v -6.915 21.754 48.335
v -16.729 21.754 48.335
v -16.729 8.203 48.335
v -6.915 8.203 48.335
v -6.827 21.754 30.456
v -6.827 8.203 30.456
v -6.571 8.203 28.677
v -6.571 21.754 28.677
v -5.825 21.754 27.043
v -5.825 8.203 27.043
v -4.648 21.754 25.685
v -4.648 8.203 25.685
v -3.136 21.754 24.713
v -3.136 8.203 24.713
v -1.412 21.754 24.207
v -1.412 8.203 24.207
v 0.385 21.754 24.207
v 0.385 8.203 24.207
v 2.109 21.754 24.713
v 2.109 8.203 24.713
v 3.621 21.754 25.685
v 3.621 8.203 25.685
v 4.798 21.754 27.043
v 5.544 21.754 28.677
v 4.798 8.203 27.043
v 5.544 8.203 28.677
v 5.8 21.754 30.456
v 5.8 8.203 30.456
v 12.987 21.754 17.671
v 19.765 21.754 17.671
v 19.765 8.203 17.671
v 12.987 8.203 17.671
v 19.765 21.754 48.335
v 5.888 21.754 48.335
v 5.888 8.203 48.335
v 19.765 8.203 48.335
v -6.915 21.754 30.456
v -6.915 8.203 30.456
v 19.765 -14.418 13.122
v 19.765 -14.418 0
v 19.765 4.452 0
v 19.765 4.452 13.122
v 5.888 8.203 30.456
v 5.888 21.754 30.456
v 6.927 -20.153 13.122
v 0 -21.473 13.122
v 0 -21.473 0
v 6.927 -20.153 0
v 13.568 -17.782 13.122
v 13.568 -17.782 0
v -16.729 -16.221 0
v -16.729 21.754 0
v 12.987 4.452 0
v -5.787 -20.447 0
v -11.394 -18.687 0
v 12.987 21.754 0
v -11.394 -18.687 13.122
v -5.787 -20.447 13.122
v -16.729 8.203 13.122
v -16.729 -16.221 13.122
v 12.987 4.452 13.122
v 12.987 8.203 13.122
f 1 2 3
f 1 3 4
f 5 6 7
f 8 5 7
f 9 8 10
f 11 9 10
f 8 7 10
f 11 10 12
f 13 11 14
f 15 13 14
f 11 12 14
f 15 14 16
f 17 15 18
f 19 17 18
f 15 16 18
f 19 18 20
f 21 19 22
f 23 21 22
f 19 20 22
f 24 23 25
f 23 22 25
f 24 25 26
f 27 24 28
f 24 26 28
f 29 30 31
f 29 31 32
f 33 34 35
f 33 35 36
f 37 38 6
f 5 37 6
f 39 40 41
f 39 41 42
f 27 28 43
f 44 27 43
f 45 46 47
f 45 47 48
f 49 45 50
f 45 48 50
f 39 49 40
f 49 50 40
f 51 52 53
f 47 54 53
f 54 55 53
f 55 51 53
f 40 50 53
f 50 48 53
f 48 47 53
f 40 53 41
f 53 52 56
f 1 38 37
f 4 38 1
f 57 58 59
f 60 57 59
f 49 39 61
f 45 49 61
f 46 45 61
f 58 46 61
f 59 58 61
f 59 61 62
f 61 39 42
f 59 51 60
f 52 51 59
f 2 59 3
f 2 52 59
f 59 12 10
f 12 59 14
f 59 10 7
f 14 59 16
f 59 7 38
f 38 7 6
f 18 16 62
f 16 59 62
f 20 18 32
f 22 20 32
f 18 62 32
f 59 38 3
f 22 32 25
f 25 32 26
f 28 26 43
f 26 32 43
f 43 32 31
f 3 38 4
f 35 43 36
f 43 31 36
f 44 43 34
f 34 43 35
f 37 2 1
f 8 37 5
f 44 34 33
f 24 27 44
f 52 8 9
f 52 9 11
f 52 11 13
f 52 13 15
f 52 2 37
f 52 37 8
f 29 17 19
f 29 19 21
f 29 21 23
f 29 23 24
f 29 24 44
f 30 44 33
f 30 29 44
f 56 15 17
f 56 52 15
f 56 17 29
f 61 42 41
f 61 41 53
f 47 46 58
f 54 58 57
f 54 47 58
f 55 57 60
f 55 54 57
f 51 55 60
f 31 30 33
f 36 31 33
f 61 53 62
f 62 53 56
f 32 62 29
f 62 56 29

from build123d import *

# Parameters (mm, degrees)
F0_W         = 53.0858039856
F0_H         = 43.5083806515
F1_DEPTH     = 48.3354907483
F2_W         = 29.9567952752
F2_H         = 35.2134015411
F3_DEPTH     = 53.0868039856
F11_W        = 12.8029063344
F11_H        = 17.8795624524
F12_DEPTH    = 13.5525853763
F13_R        = 6.3133849469
F4_DEPTH     = 13.5525853763
F5_SIZE      = 12.7
F14_T1_DEPTH = 107.6402324205
F6_W         = 13.5556794703
F6_H         = 17.6709126681
F15_DEPTH    = 17.3024511896
F7_W         = 6.7778397352
F7_H         = 30.6645780802
F7_W_2       = 9.8140304908
F7_H_2       = 48.3354907483
F8_DEPTH     = 43.2281381166
F9_W         = 6.7778397352
F9_H         = 13.1220892072
F10_DEPTH    = 25.925686927


# Not quite as in the source:
# - a fillet or chamfer that OpenCascade refuses, or shapes differently, is made with other operations: its cross-section is extruded or revolved along the edge and cut away or added


with BuildPart() as f1:
    # F0 (on Top) → F1 (new body)
    with BuildSketch(Plane.XY):
        Rectangle(F0_W, F0_H)
    extrude(amount=F1_DEPTH)

    # F2 (on face) → F3 (cut, through all)
    with BuildSketch(Plane.YZ.offset(26.5429019928)):
        with Locations((-6.7757926881, 30.7287899777)):
            Rectangle(F2_W, F2_H)
    extrude(amount=-F3_DEPTH, mode=Mode.SUBTRACT)

    # F11 (on face) → F12 (cut, through all)
    with BuildSketch(Plane.XZ.offset(-8.2026049495)):
        with Locations((-0.513387844, 39.3957095221)):
            Rectangle(F11_W, F11_H)
    extrude(amount=-F12_DEPTH, mode=Mode.SUBTRACT)

    # F13 (on face) → F4 (cut, through all)
    with BuildSketch(Plane.XZ.offset(-8.2026049495)):
        with Locations((-0.513387844, 30.4559282959)):
            Circle(F13_R)
    extrude(amount=-F4_DEPTH, mode=Mode.SUBTRACT)

    # F5
    f5_edges = [f1.edges().sort_by_distance(p)[0] for p in [
        (26.542902, -21.75419, 6.561045),
        (-26.542902, -21.75419, 6.561045),
    ]]
    chamfer(f5_edges, length=F5_SIZE)

    # F14: fillet of radius 45.6724150938 on 2 edges, made by hand

    # F14_s2 → F14_t1 (cut)
    with BuildSketch(Plane.XY.offset(-47.2590716067)):
        with BuildLine():
            ThreePointArc((5.0607266499, -21.7541903257), (-11.9692421066, -18.4604215607), (-26.5429019928, -9.0541903257))
            Line((-26.5429019928, -9.0541903257), (-13.8429019928, -21.7541903257))
            Line((-13.8429019928, -21.7541903257), (5.0607266499, -21.7541903257))
        make_face()
        with BuildLine():
            ThreePointArc((-5.0607266499, -21.7541903257), (11.9692421066, -18.4604215607), (26.5429019928, -9.0541903257))
            Line((26.5429019928, -9.0541903257), (13.8429019928, -21.7541903257))
            Line((13.8429019928, -21.7541903257), (-5.0607266499, -21.7541903257))
        make_face()
    extrude(amount=F14_T1_DEPTH, mode=Mode.SUBTRACT)

    # F6 (on face) → F15 (cut)
    with BuildSketch(Plane(origin=(0, 21.7541903257, 0), x_dir=(-1, 0, 0), z_dir=(0, 1, 0))):
        with Locations((-19.7650622576, 8.8354563341)):
            Rectangle(F6_W, F6_H)
    extrude(amount=-F15_DEPTH, mode=Mode.SUBTRACT)

    # F7 (on face) → F8 (cut, through all)
    with BuildSketch(Plane(origin=(0, 21.7541903257, 0), x_dir=(-1, 0, 0), z_dir=(0, 1, 0))):
        with Locations((-23.1539821252, 33.0032017082)):
            Rectangle(F7_W, F7_H)
        with Locations((21.6358867474, 24.1677453741)):
            Rectangle(F7_W_2, F7_H_2)
    extrude(amount=-F8_DEPTH, mode=Mode.SUBTRACT)

    # F9 (on face) → F10 (cut, through all)
    with BuildSketch(Plane(origin=(0, 4.4517391361, 0), x_dir=(-1, 0, 0), z_dir=(0, 1, 0))):
        with Locations((-23.1539821252, 6.5610446036)):
            Rectangle(F9_W, F9_H)
    extrude(amount=-F10_DEPTH, mode=Mode.SUBTRACT)


solid = f1.part
